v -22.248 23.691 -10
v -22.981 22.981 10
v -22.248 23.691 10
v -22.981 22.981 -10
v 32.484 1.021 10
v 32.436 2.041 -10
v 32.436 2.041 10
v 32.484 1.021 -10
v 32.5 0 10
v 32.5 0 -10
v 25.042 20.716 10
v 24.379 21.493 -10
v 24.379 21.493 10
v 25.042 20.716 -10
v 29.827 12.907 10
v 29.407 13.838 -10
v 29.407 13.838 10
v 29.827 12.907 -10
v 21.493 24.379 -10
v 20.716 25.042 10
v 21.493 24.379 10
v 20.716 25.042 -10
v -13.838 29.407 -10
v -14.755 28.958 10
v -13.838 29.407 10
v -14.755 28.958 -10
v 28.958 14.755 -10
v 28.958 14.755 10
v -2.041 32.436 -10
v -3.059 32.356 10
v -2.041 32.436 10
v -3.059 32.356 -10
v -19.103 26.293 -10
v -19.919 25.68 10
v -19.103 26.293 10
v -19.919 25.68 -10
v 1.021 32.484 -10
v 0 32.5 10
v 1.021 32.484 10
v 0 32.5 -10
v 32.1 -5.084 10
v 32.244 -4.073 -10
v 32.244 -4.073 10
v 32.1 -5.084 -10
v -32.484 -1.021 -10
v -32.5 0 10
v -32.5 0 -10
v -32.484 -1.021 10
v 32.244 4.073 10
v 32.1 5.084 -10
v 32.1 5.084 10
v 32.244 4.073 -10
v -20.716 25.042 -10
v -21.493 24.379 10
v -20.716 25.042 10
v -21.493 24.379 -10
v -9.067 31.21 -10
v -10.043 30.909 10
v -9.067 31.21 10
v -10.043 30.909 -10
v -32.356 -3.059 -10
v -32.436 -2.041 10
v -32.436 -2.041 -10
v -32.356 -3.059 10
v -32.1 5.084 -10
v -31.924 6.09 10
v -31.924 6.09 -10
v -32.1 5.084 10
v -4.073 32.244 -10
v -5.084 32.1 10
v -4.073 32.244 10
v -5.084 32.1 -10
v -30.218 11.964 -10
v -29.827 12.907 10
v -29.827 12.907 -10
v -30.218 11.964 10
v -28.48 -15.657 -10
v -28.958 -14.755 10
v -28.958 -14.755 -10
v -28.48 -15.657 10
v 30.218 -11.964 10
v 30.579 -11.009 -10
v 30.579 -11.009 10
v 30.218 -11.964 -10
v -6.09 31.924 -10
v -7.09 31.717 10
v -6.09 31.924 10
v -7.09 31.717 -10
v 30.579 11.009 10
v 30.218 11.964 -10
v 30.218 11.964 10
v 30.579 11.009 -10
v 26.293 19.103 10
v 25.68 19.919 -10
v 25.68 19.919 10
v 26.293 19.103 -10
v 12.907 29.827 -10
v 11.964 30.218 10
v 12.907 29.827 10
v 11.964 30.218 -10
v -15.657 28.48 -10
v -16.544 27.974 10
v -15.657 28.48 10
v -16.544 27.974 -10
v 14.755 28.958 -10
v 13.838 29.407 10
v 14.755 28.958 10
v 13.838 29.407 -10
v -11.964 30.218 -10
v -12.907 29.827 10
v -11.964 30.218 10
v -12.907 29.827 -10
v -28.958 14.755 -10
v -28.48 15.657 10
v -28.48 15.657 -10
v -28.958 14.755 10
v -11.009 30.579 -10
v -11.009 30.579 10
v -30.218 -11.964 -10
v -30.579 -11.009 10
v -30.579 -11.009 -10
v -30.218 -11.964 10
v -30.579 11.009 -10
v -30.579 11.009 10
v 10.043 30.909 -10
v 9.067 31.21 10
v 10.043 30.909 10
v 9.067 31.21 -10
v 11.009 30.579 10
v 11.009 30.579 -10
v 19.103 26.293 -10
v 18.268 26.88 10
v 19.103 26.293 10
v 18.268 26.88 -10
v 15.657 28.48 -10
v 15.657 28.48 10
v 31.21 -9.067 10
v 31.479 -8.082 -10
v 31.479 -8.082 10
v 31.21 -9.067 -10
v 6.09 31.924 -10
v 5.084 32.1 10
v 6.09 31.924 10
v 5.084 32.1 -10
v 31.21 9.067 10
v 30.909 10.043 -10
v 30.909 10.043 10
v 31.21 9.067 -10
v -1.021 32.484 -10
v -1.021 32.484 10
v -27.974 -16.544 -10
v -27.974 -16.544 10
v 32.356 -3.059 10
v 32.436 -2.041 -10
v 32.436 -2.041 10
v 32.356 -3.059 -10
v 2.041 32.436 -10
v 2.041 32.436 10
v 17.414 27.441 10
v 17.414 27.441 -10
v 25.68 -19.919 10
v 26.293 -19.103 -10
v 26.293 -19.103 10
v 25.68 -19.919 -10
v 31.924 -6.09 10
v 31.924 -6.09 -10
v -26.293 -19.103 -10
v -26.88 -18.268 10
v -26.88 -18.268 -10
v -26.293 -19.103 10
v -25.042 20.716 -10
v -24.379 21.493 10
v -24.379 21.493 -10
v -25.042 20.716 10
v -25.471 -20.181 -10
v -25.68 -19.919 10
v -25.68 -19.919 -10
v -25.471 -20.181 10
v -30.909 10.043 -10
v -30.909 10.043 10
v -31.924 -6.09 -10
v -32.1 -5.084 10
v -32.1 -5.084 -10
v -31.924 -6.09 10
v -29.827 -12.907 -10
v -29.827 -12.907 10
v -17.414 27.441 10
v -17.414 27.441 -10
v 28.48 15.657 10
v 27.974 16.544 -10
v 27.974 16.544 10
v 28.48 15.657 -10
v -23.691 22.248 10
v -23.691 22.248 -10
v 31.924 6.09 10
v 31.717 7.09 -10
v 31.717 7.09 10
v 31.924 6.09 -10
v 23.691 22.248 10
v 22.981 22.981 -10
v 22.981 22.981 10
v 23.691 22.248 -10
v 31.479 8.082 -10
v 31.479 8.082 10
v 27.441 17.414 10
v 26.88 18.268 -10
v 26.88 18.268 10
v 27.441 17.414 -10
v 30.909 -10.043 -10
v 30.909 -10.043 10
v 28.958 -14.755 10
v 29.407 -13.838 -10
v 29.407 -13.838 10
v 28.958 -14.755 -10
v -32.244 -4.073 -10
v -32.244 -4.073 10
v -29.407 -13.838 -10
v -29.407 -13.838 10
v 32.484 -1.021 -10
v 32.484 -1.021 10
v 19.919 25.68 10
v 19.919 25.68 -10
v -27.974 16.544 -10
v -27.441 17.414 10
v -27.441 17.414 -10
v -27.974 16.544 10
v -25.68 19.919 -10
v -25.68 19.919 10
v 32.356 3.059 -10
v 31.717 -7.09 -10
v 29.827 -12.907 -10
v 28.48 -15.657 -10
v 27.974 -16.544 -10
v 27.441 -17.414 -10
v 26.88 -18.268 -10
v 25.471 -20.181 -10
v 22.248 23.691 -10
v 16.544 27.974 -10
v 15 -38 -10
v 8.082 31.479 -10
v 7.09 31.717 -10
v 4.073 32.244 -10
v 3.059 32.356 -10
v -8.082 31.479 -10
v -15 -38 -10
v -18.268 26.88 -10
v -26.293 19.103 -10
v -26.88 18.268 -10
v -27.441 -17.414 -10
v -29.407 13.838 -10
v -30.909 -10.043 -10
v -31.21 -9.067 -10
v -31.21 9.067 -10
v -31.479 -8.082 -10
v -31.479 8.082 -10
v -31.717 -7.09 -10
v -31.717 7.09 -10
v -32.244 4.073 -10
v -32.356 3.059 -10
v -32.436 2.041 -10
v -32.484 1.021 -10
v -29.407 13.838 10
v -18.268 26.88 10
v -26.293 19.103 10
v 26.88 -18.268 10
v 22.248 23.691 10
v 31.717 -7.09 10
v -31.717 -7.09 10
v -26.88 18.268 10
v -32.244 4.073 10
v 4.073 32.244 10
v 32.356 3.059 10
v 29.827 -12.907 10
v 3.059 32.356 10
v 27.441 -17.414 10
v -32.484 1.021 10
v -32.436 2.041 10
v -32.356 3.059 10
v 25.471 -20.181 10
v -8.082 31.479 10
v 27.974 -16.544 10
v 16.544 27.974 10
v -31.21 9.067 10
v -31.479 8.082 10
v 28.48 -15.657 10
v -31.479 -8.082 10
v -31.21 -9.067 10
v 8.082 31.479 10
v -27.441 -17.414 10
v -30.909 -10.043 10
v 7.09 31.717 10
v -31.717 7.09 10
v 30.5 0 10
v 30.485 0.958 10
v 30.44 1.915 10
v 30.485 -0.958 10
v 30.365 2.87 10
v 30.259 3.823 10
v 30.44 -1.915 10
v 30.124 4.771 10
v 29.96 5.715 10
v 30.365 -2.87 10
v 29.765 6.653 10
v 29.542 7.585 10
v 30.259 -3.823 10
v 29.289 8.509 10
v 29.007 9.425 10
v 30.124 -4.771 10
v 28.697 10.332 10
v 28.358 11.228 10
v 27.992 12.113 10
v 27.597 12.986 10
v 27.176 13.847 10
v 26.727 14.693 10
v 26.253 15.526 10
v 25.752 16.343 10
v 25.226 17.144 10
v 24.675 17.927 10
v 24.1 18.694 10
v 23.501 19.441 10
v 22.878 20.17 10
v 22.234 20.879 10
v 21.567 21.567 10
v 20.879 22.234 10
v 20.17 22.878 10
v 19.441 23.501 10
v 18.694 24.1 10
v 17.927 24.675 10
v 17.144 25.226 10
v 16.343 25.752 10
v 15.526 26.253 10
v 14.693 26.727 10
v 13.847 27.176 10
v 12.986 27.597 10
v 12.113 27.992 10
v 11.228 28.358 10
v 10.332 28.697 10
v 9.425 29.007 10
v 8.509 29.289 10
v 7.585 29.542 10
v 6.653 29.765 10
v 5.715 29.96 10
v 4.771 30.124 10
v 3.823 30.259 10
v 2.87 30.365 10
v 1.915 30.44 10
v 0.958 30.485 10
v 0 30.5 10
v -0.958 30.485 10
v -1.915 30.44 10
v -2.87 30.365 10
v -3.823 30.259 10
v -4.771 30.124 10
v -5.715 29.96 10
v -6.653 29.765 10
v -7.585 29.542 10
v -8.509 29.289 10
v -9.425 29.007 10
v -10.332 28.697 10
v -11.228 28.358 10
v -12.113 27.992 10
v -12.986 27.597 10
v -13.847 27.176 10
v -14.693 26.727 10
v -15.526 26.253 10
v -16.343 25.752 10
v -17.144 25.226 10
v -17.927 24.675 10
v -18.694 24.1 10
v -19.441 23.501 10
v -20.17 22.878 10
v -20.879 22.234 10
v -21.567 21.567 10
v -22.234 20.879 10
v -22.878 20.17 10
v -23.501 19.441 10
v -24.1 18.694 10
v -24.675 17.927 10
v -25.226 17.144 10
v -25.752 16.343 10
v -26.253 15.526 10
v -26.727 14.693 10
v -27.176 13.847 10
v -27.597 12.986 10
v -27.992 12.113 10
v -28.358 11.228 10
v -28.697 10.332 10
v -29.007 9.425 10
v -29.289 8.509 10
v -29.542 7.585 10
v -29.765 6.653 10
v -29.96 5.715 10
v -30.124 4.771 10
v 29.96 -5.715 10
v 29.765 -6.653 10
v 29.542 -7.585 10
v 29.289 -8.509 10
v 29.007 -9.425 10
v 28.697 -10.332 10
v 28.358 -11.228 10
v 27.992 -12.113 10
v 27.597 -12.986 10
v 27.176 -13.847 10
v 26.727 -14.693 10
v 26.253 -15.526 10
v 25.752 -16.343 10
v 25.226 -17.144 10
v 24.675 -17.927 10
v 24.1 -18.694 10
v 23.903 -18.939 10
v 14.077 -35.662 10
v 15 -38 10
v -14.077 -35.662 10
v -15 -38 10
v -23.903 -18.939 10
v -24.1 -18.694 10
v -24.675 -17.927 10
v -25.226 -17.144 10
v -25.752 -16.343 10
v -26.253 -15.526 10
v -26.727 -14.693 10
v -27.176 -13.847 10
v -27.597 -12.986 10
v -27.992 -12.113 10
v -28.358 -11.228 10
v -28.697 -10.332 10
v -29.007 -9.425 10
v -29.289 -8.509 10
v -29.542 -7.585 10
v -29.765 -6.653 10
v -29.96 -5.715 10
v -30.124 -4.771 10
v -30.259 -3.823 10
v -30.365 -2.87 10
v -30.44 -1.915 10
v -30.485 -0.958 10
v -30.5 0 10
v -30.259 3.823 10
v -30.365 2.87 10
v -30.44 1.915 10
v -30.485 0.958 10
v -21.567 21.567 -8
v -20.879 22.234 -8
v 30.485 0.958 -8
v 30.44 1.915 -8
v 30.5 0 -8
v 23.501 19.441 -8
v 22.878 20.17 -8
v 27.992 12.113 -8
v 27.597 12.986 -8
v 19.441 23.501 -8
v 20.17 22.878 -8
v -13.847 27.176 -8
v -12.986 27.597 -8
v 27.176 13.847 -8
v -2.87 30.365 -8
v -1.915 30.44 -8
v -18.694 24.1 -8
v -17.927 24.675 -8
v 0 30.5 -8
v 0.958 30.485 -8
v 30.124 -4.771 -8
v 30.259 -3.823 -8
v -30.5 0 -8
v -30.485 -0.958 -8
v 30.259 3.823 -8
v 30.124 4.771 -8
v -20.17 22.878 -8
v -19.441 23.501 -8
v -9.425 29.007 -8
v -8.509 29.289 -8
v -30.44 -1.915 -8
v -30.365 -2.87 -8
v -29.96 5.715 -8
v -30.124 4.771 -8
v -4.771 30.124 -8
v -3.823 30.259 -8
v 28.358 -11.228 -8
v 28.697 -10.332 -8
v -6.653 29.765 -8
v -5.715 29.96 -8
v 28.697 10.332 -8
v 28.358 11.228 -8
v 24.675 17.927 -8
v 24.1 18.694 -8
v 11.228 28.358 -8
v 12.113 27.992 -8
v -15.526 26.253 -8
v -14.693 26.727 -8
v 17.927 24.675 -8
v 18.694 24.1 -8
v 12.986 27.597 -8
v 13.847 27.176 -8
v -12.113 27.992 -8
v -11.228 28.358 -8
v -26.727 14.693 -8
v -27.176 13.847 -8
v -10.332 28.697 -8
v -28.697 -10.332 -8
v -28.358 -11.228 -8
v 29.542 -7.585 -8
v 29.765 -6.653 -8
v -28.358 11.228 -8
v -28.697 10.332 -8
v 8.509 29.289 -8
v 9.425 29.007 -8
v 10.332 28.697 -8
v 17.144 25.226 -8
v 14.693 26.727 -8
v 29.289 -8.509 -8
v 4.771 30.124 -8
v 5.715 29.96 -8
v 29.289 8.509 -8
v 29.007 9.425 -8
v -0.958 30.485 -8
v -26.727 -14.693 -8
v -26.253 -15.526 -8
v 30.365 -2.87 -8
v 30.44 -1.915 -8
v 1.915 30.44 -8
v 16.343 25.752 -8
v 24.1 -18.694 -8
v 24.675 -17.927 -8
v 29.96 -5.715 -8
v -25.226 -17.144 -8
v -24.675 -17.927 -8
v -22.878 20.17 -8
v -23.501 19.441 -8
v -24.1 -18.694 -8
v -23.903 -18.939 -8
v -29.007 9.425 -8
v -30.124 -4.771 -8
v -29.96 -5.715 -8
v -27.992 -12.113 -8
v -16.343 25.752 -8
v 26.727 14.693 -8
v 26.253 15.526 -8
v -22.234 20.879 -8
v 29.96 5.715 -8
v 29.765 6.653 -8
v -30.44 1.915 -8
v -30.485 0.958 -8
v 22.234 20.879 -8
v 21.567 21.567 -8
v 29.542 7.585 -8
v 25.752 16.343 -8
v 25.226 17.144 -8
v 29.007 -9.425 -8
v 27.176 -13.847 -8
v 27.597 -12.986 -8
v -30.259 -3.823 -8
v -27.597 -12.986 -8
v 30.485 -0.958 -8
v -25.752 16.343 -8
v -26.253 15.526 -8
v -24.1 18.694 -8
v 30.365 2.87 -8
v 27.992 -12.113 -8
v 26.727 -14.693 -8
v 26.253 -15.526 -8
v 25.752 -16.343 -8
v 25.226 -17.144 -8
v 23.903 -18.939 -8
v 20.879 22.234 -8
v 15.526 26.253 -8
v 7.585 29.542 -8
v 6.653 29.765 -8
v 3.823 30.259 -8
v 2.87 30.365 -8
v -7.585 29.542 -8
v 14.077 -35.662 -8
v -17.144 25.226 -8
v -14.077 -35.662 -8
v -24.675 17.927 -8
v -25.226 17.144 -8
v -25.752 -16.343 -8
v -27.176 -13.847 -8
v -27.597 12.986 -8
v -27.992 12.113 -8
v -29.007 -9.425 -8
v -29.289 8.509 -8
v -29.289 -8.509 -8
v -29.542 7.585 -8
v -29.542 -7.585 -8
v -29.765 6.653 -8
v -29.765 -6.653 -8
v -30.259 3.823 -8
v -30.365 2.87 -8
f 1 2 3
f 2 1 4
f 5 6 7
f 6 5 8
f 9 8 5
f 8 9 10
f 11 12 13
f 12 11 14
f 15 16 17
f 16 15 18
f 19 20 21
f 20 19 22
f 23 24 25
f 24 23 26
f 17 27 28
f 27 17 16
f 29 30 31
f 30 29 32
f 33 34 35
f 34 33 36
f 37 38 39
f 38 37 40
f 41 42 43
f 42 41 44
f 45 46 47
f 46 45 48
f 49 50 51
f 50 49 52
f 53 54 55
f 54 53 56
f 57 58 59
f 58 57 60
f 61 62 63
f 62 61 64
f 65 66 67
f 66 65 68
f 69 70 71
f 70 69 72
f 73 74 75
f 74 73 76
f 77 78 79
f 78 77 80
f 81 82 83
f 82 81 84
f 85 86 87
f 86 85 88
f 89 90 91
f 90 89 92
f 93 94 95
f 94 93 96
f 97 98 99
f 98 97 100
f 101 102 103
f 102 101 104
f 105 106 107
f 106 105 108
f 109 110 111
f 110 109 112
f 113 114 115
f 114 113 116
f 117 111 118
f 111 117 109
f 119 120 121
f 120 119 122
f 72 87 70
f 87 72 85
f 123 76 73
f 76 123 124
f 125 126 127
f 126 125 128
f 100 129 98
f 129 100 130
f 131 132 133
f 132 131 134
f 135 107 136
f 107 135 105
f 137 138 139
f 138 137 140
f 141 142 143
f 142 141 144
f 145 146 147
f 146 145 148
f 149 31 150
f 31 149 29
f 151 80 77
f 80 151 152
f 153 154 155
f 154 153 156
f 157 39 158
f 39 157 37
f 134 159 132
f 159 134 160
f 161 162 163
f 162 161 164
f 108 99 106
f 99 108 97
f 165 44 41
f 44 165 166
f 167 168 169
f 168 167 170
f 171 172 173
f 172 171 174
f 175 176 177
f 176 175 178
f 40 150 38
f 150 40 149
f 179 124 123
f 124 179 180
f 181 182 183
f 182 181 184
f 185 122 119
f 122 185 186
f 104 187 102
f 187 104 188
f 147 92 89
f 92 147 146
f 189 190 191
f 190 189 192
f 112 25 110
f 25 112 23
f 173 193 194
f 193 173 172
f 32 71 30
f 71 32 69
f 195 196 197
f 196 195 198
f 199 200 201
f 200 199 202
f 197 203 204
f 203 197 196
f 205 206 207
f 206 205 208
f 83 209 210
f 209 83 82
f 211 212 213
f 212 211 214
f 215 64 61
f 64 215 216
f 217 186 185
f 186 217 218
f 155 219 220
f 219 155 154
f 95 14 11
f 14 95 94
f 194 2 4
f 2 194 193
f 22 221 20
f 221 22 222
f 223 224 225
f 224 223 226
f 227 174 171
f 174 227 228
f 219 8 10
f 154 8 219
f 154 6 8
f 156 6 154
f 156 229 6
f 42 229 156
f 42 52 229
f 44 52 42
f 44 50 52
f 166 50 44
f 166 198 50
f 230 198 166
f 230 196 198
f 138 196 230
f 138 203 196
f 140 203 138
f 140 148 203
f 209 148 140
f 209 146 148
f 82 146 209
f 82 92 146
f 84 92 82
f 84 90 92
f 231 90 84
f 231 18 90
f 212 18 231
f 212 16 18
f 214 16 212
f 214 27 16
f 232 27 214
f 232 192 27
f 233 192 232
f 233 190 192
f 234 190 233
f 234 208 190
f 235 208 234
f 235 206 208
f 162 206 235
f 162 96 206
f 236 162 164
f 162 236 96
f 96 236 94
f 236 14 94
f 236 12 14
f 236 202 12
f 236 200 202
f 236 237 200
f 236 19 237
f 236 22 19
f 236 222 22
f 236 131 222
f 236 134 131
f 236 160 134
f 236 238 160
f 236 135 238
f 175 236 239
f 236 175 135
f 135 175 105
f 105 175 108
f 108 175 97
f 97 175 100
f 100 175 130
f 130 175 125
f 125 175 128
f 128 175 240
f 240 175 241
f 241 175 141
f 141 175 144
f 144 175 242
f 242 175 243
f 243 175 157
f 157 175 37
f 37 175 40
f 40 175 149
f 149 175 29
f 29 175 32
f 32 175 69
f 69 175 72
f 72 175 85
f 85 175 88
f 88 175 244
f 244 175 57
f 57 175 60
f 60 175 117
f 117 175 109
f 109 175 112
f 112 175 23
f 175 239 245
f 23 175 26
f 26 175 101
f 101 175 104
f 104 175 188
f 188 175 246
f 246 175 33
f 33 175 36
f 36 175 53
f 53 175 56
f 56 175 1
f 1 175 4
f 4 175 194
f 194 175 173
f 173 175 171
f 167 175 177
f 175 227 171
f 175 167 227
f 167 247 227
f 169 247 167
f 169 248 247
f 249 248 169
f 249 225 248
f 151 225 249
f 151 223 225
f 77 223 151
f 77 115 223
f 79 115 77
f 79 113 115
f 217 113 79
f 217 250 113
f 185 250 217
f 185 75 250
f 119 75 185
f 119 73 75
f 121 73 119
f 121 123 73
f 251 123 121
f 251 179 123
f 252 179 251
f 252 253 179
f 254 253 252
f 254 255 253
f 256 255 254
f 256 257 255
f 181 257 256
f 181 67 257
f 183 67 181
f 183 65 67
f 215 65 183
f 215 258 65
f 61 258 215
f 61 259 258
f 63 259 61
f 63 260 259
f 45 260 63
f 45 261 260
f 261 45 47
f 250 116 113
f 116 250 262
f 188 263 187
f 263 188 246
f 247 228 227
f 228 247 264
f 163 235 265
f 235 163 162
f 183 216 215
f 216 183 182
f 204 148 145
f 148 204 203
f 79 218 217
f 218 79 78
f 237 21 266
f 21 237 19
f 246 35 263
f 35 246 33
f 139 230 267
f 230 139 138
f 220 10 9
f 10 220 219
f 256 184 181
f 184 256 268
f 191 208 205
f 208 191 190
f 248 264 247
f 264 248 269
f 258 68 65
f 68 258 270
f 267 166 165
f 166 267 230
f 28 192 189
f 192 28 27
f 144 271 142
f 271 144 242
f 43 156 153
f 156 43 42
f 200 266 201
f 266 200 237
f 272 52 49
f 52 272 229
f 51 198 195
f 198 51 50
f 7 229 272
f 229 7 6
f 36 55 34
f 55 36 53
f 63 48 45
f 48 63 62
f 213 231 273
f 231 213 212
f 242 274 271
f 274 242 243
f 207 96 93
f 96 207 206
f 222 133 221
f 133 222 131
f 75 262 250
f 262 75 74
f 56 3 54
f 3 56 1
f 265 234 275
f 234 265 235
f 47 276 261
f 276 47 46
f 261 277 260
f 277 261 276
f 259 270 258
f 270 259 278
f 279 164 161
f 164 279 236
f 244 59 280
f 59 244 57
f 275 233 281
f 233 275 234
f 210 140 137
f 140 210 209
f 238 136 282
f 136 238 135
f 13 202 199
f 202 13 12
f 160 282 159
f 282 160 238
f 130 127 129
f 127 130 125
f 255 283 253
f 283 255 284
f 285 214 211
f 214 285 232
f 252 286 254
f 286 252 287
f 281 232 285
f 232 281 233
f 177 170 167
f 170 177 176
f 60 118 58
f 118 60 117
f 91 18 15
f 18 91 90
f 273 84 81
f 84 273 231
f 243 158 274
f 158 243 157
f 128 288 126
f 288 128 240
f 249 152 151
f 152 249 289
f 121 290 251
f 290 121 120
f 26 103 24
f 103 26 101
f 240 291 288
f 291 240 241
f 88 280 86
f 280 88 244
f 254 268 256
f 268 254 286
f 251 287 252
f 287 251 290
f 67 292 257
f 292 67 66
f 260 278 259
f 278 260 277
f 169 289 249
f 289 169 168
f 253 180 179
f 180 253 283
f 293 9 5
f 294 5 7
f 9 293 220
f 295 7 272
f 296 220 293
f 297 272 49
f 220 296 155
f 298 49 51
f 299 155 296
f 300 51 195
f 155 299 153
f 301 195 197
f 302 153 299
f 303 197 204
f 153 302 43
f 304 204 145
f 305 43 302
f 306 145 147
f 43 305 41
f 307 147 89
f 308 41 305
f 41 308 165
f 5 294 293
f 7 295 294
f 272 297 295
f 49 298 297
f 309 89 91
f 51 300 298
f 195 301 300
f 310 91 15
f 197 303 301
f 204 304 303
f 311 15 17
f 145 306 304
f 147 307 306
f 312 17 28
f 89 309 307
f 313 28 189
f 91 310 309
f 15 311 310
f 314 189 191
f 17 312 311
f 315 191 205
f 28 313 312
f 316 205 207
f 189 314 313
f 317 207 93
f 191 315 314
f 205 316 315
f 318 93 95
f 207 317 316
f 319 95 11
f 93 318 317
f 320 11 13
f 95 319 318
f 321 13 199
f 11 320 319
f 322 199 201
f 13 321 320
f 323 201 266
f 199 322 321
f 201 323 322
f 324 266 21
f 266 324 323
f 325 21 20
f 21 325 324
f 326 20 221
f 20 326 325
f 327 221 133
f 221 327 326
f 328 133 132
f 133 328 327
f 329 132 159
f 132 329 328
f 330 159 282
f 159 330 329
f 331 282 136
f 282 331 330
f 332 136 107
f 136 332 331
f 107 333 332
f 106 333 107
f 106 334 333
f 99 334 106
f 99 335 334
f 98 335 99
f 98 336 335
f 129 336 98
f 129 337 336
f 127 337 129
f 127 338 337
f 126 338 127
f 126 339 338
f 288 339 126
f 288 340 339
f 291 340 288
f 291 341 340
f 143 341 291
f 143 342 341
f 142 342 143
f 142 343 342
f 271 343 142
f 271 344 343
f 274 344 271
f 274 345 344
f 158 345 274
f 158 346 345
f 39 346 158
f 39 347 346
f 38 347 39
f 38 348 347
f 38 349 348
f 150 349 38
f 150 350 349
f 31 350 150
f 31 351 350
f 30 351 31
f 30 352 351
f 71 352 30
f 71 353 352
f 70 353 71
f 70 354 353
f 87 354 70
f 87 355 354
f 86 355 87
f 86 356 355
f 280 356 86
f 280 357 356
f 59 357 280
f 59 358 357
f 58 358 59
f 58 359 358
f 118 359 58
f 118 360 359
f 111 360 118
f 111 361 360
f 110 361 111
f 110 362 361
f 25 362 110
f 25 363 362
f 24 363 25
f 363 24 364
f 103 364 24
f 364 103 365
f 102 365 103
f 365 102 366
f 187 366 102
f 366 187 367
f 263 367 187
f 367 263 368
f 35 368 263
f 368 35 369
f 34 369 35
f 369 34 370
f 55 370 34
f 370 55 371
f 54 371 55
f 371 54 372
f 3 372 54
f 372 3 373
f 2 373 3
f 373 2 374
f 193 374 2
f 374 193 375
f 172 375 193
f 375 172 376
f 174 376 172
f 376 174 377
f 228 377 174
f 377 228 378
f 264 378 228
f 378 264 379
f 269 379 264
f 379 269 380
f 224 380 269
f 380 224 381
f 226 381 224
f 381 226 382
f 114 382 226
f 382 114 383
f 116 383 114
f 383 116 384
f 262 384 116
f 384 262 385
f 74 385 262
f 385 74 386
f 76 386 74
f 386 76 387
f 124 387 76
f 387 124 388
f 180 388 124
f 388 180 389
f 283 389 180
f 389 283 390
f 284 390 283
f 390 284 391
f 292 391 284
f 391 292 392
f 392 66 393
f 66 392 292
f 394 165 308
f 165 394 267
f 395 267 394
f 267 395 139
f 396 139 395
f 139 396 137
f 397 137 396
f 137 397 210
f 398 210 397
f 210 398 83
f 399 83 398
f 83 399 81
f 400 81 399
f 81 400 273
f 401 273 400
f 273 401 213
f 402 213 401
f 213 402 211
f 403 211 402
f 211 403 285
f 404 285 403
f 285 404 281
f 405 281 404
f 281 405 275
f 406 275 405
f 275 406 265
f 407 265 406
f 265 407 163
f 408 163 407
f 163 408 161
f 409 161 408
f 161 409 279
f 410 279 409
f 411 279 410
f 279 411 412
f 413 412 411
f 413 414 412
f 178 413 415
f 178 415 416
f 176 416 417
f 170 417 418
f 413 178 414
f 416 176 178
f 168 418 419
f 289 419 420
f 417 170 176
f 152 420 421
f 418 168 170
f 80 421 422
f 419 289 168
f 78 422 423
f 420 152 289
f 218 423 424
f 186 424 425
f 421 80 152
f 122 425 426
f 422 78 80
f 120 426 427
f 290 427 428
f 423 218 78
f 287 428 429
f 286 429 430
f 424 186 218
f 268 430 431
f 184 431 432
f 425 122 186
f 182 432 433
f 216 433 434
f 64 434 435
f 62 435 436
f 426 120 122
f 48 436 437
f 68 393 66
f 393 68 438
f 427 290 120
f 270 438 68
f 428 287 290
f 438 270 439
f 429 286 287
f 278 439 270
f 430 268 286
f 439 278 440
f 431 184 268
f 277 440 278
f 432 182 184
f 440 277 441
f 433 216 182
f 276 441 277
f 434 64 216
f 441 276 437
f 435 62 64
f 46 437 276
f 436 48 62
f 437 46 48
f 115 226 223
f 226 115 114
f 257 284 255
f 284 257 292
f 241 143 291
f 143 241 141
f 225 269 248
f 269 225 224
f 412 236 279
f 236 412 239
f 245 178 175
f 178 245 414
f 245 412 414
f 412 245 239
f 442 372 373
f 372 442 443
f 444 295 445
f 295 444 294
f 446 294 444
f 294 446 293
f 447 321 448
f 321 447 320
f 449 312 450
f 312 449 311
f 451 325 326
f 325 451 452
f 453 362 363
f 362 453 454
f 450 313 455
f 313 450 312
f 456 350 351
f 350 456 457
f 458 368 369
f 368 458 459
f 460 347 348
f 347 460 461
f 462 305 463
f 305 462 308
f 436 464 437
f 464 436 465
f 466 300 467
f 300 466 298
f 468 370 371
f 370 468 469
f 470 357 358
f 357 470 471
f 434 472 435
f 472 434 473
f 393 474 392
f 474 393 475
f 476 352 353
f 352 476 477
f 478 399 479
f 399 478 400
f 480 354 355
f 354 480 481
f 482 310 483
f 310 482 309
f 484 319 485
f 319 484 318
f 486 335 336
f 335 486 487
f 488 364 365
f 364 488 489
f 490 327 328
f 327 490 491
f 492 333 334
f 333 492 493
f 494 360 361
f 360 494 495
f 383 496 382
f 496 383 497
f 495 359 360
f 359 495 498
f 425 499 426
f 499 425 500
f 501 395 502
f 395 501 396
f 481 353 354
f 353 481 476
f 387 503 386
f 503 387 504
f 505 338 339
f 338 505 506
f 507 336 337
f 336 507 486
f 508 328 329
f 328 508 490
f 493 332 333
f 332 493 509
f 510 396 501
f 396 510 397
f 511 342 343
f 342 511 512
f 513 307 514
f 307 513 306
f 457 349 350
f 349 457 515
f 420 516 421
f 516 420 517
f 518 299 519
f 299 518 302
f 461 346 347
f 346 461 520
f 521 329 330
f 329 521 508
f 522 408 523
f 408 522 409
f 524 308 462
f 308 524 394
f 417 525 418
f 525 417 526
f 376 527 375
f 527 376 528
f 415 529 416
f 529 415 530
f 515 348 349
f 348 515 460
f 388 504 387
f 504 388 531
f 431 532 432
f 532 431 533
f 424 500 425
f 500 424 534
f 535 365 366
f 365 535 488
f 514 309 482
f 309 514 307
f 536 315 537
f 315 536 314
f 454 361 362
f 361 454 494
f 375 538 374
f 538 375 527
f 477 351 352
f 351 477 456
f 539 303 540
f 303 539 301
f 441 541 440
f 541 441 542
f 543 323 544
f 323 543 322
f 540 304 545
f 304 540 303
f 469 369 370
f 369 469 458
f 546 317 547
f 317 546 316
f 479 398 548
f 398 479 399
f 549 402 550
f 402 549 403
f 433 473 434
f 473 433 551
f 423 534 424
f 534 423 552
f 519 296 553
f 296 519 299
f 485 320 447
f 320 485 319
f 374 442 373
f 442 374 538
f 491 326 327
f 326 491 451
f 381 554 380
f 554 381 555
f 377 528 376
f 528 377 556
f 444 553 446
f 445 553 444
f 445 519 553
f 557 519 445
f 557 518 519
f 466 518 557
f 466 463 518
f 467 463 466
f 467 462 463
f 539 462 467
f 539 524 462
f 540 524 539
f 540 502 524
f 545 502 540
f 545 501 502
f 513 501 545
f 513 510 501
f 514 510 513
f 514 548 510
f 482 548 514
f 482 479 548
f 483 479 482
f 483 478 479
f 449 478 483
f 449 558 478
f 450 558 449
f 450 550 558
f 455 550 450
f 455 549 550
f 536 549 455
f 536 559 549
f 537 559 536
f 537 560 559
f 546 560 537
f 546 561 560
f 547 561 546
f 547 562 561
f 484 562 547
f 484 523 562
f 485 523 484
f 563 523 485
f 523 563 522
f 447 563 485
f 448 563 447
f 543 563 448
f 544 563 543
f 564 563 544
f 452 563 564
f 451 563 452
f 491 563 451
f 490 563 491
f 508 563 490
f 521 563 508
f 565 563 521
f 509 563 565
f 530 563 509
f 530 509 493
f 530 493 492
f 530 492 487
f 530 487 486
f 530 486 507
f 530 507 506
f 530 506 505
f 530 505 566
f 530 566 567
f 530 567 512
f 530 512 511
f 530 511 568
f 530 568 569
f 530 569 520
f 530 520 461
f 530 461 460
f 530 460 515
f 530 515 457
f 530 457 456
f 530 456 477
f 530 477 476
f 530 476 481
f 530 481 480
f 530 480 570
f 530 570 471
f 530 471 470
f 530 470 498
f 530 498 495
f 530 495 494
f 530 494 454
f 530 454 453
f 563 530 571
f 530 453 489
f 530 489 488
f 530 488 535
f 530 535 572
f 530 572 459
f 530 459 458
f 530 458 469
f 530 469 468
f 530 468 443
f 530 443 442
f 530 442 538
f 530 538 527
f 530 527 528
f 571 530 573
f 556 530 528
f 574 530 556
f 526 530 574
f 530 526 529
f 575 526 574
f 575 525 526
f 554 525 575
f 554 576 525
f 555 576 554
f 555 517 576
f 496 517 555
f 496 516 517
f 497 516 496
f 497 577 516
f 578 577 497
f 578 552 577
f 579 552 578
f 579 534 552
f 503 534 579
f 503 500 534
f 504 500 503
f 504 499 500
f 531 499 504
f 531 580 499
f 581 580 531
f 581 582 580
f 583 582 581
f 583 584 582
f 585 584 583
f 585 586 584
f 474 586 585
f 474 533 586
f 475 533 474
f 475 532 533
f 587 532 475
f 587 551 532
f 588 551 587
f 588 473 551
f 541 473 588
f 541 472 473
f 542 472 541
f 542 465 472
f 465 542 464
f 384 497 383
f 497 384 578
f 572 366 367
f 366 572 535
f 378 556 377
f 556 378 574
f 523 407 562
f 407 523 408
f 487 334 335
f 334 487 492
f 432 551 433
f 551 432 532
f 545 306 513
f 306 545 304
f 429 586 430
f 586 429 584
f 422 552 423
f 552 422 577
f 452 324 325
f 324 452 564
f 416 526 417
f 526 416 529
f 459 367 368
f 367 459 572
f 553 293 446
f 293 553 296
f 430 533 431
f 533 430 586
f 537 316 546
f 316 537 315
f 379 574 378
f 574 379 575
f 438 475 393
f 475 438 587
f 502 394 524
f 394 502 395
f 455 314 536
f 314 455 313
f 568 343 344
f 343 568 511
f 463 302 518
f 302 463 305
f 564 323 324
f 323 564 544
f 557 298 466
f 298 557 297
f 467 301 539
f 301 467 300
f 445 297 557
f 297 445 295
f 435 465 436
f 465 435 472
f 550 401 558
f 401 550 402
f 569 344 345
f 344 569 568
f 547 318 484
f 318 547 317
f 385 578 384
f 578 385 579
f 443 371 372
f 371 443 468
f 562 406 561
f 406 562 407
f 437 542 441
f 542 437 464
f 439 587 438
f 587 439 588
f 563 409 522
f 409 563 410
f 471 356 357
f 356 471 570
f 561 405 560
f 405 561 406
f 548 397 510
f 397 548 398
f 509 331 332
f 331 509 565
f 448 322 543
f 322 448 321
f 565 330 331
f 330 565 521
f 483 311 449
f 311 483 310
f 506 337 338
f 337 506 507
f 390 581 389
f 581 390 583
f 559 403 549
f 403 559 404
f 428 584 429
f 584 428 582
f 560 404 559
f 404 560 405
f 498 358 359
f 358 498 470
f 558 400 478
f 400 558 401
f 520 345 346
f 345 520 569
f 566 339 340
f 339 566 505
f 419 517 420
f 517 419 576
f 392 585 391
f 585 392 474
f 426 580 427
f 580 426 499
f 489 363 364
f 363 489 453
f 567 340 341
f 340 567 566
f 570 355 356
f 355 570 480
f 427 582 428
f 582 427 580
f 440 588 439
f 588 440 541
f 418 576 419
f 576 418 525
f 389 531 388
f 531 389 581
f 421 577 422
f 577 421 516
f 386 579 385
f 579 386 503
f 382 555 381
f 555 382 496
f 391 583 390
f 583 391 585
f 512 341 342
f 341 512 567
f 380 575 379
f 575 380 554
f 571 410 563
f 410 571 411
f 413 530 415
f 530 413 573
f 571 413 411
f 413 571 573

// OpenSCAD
$fn=200;
diameter = 65;
bottom_width = 30;
bottom_length = 25;
height=20;
wall_width = 2;

wall_scale_factor = 1-(wall_width*2)/diameter;
echo("Wall scale factor: ", wall_scale_factor);

module raw() {
intersection() {
    cylinder(d=diameter, h=height, center=true);
//    translate([-diameter/2, -14, 0])
//    cube([diameter, diameter, height]);
}

deg = 66;

translate([0, -13, 0])
translate([0,0,-height/2])
linear_extrude(height=height, convexity=10) {
polygon([[-diameter * sin(deg)/2, 0],
           [-bottom_width/2, -bottom_length],
           [bottom_width/2, -bottom_length],
           [diameter * sin(deg)/2, 0]]);
}
}

module lcd() {
    cube([28,28,2], center=true);
    translate([0,2,-1])
    cube([28,15,2], center=true);
}

difference() {
    raw();
    translate([0,0,wall_width])
    scale([wall_scale_factor, wall_scale_factor, 1])
    raw();
    
    translate([0, 10, -6])
    #lcd();
}
